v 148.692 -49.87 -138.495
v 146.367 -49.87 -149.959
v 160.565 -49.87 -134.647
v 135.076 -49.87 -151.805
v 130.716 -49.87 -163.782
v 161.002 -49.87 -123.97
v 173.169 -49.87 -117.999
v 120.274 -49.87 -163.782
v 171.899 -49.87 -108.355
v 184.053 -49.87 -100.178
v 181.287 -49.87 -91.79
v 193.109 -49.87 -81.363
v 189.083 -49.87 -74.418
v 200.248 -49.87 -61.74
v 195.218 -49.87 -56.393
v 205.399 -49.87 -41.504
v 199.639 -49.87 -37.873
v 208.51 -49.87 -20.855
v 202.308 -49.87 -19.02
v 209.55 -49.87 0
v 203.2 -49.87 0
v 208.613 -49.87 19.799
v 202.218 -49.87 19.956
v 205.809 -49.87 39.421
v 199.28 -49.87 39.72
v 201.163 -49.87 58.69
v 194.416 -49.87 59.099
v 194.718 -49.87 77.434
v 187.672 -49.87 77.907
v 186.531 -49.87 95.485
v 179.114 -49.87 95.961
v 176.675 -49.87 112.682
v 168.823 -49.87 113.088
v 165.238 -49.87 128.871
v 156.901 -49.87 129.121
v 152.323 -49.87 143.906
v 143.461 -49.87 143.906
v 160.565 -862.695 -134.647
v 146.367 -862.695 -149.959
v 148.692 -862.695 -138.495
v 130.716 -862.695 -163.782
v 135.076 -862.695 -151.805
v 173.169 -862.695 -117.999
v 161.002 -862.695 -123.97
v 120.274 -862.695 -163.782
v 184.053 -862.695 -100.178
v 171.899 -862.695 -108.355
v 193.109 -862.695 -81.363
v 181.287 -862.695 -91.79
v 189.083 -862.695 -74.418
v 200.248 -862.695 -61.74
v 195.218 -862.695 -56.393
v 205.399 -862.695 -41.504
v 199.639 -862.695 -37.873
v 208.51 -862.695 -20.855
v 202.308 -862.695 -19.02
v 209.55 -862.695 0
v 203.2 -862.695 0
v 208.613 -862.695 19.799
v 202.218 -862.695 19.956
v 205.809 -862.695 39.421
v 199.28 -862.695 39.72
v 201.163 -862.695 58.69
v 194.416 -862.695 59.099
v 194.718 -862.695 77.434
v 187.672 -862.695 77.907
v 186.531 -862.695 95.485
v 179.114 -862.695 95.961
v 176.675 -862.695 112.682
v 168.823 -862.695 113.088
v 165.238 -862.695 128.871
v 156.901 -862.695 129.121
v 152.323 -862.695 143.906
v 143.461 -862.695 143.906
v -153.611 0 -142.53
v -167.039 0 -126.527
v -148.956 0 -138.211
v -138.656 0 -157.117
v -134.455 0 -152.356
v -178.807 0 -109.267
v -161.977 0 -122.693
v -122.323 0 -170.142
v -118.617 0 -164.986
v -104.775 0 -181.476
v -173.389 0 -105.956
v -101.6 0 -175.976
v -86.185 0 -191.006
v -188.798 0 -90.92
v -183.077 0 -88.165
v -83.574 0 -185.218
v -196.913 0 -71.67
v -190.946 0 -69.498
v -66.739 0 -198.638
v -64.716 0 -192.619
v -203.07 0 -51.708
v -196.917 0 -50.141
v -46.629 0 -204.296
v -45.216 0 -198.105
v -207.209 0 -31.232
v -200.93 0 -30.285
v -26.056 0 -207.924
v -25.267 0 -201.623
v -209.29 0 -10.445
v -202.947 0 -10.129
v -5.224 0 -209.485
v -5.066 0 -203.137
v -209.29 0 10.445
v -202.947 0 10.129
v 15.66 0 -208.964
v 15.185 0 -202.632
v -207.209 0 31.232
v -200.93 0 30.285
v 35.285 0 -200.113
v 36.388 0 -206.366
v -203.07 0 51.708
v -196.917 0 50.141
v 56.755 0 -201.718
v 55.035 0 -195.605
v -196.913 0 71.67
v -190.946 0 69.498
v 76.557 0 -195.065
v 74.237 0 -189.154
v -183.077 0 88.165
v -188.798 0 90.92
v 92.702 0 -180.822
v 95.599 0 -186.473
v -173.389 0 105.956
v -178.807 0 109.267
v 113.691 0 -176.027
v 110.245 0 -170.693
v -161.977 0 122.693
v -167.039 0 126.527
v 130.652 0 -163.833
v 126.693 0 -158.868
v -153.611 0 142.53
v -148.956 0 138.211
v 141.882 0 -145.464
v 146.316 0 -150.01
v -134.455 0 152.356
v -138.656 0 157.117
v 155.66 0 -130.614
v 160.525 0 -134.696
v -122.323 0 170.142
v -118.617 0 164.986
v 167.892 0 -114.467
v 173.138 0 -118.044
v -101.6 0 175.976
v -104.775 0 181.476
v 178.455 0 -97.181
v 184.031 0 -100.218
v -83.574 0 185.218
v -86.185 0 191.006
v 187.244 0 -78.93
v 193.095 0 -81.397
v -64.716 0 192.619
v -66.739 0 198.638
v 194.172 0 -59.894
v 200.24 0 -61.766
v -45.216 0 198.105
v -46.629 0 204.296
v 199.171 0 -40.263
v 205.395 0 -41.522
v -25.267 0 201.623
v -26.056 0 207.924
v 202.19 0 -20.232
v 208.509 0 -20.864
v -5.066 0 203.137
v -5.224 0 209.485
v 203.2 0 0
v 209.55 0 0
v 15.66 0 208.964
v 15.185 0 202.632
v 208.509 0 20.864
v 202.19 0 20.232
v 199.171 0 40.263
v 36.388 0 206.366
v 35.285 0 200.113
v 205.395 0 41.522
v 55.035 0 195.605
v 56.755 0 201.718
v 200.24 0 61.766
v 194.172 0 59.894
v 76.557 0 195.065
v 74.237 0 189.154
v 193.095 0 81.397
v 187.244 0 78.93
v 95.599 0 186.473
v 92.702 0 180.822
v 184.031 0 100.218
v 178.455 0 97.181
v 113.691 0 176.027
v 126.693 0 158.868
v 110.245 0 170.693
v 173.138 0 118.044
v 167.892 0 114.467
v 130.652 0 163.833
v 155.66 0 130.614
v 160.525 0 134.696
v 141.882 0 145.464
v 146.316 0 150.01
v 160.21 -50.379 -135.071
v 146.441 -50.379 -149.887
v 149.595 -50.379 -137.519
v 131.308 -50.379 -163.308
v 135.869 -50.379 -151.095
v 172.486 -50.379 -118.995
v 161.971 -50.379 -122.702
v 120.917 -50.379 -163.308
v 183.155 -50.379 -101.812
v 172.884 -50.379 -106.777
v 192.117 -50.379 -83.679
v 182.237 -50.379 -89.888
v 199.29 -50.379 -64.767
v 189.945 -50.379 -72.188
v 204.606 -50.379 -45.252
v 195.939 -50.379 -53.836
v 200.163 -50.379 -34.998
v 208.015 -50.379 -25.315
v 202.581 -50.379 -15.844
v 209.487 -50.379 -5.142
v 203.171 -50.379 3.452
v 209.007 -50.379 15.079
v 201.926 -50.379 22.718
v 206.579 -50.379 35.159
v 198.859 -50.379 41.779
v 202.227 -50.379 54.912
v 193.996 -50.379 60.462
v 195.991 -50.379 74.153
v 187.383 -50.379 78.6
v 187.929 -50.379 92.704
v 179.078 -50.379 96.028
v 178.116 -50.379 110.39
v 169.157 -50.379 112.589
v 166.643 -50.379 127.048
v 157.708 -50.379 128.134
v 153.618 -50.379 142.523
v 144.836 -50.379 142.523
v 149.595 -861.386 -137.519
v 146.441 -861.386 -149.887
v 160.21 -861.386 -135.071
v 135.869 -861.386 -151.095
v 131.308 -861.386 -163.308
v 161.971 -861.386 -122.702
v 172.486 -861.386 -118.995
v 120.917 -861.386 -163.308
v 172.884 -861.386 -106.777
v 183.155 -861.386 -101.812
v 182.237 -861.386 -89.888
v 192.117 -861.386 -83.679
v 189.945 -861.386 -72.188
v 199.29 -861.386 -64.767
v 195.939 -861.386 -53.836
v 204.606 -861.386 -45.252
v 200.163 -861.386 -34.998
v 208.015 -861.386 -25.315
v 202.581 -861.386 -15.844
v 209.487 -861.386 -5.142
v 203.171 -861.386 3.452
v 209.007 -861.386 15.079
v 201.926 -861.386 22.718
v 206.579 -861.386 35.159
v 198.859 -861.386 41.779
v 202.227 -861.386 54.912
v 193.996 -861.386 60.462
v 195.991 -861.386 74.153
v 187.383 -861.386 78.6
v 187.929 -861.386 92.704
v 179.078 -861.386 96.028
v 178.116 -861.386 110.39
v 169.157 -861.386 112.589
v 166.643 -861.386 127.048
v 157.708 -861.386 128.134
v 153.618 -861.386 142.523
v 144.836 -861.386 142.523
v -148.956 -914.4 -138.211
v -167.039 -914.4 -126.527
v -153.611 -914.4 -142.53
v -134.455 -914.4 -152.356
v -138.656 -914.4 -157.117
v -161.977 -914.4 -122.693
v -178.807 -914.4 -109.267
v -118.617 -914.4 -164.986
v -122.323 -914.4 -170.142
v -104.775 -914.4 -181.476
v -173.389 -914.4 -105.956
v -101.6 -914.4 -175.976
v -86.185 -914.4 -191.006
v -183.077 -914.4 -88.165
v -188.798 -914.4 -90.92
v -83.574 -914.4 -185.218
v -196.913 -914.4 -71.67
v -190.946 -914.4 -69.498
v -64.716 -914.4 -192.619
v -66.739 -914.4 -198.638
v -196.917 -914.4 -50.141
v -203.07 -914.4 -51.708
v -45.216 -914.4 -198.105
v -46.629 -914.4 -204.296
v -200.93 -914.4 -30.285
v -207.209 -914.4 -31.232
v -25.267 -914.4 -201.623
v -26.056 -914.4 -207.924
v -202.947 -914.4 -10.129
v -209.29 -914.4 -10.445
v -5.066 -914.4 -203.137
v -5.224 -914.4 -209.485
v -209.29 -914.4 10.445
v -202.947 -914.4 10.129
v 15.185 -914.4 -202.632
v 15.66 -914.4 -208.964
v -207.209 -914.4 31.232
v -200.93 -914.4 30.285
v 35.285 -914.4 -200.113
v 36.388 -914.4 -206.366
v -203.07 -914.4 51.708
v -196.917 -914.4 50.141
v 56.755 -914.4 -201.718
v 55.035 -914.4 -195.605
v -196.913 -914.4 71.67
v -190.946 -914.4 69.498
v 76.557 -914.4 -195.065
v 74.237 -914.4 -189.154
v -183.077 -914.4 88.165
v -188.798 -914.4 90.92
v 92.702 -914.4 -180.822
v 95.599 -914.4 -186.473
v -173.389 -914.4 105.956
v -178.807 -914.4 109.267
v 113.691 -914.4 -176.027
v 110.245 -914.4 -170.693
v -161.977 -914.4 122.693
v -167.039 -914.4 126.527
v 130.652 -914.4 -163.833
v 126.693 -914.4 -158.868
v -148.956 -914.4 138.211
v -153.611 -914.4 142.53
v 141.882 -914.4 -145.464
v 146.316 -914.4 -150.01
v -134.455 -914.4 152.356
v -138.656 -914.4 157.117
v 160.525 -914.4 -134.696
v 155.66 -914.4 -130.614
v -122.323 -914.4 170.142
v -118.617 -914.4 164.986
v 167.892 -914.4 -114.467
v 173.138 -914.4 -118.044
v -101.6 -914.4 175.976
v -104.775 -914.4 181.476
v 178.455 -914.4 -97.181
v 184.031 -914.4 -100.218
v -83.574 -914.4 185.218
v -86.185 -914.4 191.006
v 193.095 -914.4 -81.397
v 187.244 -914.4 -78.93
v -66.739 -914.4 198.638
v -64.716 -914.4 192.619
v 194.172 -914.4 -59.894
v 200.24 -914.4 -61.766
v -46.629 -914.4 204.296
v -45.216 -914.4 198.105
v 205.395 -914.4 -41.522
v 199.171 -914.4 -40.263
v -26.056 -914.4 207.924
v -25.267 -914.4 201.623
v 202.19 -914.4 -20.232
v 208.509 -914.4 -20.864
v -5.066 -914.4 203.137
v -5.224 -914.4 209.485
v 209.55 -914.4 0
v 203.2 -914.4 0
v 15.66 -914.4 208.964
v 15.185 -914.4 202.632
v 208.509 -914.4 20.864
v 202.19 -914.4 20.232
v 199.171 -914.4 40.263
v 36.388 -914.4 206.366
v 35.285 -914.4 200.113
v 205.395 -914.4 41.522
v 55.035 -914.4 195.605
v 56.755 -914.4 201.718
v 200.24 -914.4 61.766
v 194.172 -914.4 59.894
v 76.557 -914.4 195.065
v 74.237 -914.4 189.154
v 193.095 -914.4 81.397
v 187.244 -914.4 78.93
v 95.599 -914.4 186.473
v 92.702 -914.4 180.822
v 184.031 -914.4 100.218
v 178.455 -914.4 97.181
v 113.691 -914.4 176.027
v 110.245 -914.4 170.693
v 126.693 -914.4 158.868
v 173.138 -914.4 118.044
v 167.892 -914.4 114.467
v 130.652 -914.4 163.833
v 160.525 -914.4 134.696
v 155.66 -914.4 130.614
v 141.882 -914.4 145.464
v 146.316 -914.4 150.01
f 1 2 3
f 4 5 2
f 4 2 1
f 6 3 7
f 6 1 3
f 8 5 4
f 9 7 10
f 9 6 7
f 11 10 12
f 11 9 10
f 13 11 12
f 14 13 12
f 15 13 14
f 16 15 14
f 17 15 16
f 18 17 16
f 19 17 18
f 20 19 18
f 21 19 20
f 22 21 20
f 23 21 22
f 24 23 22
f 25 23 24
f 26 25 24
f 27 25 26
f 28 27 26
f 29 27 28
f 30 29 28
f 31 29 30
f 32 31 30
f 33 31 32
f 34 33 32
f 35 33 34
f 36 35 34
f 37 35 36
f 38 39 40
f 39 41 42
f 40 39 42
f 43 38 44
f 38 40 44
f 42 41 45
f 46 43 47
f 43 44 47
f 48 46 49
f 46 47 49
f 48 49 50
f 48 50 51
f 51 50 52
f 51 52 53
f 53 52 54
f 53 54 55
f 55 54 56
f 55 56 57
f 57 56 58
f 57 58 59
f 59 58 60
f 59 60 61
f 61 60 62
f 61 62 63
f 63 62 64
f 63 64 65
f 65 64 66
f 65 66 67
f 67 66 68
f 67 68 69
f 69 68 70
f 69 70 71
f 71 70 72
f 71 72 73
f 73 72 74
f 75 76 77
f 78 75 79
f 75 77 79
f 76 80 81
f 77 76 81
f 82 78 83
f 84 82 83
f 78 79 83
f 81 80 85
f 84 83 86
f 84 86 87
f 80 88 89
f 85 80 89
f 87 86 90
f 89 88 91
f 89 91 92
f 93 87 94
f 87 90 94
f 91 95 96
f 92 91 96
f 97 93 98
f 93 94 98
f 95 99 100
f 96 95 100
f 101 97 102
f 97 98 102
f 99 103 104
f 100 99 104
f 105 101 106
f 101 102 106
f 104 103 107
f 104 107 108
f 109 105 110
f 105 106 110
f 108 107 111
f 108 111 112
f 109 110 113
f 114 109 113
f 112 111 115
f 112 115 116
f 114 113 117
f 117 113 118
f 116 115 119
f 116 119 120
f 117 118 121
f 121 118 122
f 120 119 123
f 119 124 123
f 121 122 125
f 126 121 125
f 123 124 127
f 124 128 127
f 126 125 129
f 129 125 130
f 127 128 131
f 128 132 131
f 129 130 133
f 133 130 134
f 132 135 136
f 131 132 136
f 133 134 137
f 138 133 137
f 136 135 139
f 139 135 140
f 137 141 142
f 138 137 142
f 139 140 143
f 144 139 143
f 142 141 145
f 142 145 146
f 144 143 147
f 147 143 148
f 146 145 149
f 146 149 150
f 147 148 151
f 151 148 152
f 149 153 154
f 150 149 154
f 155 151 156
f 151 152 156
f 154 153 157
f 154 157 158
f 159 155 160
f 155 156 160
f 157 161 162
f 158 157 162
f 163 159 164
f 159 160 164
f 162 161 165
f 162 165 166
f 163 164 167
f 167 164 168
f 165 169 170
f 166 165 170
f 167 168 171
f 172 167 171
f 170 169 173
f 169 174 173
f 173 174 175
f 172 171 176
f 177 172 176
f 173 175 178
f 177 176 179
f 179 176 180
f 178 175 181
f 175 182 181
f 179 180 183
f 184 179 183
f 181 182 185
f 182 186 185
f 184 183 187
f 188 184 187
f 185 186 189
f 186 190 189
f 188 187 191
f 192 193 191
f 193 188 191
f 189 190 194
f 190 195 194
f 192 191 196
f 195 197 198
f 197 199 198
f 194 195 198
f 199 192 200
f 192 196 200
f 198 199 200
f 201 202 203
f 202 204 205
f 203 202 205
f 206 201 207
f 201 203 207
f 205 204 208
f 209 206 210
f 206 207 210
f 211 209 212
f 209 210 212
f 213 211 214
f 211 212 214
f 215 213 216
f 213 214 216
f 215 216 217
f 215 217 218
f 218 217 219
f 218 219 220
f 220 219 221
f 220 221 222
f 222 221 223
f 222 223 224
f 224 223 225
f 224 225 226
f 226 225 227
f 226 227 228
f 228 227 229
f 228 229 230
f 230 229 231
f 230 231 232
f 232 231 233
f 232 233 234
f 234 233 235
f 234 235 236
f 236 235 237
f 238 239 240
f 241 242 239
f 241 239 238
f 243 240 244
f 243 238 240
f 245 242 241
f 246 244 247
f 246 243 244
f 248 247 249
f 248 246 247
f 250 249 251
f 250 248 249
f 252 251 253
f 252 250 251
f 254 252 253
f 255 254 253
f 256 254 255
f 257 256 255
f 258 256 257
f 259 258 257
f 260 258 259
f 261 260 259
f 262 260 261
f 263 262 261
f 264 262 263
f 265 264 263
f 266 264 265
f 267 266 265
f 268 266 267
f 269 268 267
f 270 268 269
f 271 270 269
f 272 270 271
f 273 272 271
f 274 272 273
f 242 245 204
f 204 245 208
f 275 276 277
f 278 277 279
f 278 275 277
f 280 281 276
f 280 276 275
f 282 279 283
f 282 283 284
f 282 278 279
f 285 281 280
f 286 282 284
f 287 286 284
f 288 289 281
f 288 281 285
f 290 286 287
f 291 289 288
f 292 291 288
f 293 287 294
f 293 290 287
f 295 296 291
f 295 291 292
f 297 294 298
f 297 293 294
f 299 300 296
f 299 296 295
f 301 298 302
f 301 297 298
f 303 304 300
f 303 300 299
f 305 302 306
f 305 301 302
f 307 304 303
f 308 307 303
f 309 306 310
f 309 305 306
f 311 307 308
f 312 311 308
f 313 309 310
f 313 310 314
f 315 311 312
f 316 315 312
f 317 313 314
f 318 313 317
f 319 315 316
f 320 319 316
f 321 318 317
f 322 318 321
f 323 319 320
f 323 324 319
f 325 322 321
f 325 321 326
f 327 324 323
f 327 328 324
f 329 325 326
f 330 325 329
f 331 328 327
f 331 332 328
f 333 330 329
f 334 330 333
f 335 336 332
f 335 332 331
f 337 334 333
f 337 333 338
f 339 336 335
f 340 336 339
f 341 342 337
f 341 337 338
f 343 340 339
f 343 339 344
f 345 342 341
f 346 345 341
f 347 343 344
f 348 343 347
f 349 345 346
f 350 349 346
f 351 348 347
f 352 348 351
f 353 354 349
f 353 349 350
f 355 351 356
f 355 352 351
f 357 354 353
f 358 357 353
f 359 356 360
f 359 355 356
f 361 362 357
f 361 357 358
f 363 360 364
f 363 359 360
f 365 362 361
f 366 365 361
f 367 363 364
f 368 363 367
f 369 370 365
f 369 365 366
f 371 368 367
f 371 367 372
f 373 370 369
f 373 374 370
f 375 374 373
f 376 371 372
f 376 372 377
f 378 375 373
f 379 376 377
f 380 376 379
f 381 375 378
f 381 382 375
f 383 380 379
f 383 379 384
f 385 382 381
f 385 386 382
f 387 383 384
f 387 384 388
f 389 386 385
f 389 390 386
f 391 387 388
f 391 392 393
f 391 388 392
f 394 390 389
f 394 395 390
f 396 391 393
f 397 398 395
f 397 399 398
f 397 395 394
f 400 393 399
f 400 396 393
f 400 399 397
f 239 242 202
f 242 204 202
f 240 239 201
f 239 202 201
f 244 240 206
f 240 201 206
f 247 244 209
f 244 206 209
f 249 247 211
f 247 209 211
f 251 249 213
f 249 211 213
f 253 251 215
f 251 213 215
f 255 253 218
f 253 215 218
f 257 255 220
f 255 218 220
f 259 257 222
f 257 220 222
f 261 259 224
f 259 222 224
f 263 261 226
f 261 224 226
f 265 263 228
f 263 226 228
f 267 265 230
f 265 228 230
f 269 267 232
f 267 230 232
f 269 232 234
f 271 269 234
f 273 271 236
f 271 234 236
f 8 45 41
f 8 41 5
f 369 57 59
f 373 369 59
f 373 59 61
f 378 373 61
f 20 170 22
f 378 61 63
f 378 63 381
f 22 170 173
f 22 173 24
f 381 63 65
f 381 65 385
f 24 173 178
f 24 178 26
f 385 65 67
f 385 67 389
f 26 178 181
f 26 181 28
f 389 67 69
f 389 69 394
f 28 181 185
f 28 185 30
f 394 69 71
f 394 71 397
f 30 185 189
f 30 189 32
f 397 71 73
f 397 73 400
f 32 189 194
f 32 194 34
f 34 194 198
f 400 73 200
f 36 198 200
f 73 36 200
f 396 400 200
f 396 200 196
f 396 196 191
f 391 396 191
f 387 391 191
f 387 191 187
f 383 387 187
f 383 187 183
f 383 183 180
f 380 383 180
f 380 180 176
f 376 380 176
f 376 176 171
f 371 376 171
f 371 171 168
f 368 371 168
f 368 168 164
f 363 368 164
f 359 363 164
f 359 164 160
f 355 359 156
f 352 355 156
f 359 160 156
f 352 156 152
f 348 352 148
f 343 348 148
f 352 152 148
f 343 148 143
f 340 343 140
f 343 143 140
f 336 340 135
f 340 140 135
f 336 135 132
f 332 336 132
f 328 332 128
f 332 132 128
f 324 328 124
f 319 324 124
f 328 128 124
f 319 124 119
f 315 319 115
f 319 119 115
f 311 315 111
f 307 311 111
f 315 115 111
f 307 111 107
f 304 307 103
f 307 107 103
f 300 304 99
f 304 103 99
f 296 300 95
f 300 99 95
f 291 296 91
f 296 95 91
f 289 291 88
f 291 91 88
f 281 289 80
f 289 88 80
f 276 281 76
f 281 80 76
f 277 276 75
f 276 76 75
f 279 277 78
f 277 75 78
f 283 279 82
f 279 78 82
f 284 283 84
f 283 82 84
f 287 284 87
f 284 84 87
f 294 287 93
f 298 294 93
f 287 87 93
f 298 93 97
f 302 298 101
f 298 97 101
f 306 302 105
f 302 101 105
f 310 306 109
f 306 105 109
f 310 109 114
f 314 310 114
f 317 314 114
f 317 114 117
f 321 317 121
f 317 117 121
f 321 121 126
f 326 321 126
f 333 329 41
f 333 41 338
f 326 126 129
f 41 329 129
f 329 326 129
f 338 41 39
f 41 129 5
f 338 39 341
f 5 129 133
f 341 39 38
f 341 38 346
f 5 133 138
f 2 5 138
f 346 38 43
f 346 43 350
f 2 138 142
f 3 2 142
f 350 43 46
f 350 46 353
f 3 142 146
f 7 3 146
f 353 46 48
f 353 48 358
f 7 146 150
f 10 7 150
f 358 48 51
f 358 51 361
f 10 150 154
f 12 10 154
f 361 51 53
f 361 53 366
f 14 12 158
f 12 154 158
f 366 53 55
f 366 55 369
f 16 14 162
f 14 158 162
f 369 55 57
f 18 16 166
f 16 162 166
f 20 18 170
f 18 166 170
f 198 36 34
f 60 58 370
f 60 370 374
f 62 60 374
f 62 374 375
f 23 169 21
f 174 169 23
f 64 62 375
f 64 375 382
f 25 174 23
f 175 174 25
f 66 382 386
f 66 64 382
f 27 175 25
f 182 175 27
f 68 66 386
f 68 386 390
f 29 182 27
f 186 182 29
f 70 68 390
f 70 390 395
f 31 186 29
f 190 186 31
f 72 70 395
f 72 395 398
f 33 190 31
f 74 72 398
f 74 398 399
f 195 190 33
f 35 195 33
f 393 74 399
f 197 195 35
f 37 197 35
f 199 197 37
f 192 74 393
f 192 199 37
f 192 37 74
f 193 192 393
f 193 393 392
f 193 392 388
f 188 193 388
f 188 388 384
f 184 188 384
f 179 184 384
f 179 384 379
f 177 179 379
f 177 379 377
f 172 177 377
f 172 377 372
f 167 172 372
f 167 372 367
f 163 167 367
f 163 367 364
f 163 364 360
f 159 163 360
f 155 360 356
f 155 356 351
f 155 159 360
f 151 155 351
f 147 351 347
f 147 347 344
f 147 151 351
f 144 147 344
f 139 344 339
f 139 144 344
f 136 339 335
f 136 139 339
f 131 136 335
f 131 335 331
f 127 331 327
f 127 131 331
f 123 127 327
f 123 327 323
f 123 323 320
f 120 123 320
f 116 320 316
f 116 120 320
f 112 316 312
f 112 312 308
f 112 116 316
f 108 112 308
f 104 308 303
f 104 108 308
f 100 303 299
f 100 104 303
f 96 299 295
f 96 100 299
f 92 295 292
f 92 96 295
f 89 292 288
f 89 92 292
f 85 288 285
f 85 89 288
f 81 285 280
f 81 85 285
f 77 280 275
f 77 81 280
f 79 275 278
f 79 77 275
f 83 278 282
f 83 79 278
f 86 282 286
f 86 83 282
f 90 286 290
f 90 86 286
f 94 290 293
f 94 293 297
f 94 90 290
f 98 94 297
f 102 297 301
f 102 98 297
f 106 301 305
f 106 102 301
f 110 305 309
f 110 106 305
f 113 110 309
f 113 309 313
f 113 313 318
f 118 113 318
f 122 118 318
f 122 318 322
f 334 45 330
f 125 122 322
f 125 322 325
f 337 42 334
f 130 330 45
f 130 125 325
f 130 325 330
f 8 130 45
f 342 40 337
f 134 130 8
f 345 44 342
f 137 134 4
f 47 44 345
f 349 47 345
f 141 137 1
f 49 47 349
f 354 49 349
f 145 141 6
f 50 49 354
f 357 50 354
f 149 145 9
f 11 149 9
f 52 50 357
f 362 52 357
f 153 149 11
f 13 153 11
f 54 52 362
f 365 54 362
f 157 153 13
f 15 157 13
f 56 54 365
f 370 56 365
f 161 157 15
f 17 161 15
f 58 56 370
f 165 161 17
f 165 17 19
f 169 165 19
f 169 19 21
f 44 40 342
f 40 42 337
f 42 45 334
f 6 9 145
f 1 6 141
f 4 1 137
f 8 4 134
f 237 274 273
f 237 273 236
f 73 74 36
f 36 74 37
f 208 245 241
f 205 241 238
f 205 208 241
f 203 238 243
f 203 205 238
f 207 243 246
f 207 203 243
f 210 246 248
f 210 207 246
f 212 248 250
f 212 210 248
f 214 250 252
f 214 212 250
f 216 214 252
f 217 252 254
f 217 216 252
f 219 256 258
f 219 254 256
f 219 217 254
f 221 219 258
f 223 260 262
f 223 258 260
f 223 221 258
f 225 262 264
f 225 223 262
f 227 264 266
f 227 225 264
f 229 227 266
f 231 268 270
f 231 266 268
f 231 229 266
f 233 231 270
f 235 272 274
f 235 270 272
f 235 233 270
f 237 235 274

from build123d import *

# Parameters (mm, degrees)
F0_R     = 209.55
F1_DEPTH = 914.4
F2_T     = -6.35
F3_W     = 812.824402
F3_H     = 307.688267
F3_W_2   = 811.00725
F3_H_2   = 305.830211
F4_DEPTH = 446.98978


with BuildPart() as f1:
    # F0 (on Front) → F1 (new body)
    with BuildSketch(Plane.XZ):
        Circle(F0_R)
    extrude(amount=F1_DEPTH)

    # F2
    f2_openings = [f1.faces().sort_by_distance(p)[0] for p in [
        (0, -914.4, 0),
        (0, 0, 0),
    ]]
    offset(amount=F2_T, openings=f2_openings)

    # F3 (on Right) → F4 (cut)
    with BuildSketch(Plane.YZ):
        with Locations((-456.282301, -9.937719)):
            Rectangle(F3_W, F3_H)
        with Locations((-455.882436, -10.392546)):
            Rectangle(F3_W_2, F3_H_2, mode=Mode.SUBTRACT)
    extrude(amount=F4_DEPTH, mode=Mode.SUBTRACT)


solid = f1.part
